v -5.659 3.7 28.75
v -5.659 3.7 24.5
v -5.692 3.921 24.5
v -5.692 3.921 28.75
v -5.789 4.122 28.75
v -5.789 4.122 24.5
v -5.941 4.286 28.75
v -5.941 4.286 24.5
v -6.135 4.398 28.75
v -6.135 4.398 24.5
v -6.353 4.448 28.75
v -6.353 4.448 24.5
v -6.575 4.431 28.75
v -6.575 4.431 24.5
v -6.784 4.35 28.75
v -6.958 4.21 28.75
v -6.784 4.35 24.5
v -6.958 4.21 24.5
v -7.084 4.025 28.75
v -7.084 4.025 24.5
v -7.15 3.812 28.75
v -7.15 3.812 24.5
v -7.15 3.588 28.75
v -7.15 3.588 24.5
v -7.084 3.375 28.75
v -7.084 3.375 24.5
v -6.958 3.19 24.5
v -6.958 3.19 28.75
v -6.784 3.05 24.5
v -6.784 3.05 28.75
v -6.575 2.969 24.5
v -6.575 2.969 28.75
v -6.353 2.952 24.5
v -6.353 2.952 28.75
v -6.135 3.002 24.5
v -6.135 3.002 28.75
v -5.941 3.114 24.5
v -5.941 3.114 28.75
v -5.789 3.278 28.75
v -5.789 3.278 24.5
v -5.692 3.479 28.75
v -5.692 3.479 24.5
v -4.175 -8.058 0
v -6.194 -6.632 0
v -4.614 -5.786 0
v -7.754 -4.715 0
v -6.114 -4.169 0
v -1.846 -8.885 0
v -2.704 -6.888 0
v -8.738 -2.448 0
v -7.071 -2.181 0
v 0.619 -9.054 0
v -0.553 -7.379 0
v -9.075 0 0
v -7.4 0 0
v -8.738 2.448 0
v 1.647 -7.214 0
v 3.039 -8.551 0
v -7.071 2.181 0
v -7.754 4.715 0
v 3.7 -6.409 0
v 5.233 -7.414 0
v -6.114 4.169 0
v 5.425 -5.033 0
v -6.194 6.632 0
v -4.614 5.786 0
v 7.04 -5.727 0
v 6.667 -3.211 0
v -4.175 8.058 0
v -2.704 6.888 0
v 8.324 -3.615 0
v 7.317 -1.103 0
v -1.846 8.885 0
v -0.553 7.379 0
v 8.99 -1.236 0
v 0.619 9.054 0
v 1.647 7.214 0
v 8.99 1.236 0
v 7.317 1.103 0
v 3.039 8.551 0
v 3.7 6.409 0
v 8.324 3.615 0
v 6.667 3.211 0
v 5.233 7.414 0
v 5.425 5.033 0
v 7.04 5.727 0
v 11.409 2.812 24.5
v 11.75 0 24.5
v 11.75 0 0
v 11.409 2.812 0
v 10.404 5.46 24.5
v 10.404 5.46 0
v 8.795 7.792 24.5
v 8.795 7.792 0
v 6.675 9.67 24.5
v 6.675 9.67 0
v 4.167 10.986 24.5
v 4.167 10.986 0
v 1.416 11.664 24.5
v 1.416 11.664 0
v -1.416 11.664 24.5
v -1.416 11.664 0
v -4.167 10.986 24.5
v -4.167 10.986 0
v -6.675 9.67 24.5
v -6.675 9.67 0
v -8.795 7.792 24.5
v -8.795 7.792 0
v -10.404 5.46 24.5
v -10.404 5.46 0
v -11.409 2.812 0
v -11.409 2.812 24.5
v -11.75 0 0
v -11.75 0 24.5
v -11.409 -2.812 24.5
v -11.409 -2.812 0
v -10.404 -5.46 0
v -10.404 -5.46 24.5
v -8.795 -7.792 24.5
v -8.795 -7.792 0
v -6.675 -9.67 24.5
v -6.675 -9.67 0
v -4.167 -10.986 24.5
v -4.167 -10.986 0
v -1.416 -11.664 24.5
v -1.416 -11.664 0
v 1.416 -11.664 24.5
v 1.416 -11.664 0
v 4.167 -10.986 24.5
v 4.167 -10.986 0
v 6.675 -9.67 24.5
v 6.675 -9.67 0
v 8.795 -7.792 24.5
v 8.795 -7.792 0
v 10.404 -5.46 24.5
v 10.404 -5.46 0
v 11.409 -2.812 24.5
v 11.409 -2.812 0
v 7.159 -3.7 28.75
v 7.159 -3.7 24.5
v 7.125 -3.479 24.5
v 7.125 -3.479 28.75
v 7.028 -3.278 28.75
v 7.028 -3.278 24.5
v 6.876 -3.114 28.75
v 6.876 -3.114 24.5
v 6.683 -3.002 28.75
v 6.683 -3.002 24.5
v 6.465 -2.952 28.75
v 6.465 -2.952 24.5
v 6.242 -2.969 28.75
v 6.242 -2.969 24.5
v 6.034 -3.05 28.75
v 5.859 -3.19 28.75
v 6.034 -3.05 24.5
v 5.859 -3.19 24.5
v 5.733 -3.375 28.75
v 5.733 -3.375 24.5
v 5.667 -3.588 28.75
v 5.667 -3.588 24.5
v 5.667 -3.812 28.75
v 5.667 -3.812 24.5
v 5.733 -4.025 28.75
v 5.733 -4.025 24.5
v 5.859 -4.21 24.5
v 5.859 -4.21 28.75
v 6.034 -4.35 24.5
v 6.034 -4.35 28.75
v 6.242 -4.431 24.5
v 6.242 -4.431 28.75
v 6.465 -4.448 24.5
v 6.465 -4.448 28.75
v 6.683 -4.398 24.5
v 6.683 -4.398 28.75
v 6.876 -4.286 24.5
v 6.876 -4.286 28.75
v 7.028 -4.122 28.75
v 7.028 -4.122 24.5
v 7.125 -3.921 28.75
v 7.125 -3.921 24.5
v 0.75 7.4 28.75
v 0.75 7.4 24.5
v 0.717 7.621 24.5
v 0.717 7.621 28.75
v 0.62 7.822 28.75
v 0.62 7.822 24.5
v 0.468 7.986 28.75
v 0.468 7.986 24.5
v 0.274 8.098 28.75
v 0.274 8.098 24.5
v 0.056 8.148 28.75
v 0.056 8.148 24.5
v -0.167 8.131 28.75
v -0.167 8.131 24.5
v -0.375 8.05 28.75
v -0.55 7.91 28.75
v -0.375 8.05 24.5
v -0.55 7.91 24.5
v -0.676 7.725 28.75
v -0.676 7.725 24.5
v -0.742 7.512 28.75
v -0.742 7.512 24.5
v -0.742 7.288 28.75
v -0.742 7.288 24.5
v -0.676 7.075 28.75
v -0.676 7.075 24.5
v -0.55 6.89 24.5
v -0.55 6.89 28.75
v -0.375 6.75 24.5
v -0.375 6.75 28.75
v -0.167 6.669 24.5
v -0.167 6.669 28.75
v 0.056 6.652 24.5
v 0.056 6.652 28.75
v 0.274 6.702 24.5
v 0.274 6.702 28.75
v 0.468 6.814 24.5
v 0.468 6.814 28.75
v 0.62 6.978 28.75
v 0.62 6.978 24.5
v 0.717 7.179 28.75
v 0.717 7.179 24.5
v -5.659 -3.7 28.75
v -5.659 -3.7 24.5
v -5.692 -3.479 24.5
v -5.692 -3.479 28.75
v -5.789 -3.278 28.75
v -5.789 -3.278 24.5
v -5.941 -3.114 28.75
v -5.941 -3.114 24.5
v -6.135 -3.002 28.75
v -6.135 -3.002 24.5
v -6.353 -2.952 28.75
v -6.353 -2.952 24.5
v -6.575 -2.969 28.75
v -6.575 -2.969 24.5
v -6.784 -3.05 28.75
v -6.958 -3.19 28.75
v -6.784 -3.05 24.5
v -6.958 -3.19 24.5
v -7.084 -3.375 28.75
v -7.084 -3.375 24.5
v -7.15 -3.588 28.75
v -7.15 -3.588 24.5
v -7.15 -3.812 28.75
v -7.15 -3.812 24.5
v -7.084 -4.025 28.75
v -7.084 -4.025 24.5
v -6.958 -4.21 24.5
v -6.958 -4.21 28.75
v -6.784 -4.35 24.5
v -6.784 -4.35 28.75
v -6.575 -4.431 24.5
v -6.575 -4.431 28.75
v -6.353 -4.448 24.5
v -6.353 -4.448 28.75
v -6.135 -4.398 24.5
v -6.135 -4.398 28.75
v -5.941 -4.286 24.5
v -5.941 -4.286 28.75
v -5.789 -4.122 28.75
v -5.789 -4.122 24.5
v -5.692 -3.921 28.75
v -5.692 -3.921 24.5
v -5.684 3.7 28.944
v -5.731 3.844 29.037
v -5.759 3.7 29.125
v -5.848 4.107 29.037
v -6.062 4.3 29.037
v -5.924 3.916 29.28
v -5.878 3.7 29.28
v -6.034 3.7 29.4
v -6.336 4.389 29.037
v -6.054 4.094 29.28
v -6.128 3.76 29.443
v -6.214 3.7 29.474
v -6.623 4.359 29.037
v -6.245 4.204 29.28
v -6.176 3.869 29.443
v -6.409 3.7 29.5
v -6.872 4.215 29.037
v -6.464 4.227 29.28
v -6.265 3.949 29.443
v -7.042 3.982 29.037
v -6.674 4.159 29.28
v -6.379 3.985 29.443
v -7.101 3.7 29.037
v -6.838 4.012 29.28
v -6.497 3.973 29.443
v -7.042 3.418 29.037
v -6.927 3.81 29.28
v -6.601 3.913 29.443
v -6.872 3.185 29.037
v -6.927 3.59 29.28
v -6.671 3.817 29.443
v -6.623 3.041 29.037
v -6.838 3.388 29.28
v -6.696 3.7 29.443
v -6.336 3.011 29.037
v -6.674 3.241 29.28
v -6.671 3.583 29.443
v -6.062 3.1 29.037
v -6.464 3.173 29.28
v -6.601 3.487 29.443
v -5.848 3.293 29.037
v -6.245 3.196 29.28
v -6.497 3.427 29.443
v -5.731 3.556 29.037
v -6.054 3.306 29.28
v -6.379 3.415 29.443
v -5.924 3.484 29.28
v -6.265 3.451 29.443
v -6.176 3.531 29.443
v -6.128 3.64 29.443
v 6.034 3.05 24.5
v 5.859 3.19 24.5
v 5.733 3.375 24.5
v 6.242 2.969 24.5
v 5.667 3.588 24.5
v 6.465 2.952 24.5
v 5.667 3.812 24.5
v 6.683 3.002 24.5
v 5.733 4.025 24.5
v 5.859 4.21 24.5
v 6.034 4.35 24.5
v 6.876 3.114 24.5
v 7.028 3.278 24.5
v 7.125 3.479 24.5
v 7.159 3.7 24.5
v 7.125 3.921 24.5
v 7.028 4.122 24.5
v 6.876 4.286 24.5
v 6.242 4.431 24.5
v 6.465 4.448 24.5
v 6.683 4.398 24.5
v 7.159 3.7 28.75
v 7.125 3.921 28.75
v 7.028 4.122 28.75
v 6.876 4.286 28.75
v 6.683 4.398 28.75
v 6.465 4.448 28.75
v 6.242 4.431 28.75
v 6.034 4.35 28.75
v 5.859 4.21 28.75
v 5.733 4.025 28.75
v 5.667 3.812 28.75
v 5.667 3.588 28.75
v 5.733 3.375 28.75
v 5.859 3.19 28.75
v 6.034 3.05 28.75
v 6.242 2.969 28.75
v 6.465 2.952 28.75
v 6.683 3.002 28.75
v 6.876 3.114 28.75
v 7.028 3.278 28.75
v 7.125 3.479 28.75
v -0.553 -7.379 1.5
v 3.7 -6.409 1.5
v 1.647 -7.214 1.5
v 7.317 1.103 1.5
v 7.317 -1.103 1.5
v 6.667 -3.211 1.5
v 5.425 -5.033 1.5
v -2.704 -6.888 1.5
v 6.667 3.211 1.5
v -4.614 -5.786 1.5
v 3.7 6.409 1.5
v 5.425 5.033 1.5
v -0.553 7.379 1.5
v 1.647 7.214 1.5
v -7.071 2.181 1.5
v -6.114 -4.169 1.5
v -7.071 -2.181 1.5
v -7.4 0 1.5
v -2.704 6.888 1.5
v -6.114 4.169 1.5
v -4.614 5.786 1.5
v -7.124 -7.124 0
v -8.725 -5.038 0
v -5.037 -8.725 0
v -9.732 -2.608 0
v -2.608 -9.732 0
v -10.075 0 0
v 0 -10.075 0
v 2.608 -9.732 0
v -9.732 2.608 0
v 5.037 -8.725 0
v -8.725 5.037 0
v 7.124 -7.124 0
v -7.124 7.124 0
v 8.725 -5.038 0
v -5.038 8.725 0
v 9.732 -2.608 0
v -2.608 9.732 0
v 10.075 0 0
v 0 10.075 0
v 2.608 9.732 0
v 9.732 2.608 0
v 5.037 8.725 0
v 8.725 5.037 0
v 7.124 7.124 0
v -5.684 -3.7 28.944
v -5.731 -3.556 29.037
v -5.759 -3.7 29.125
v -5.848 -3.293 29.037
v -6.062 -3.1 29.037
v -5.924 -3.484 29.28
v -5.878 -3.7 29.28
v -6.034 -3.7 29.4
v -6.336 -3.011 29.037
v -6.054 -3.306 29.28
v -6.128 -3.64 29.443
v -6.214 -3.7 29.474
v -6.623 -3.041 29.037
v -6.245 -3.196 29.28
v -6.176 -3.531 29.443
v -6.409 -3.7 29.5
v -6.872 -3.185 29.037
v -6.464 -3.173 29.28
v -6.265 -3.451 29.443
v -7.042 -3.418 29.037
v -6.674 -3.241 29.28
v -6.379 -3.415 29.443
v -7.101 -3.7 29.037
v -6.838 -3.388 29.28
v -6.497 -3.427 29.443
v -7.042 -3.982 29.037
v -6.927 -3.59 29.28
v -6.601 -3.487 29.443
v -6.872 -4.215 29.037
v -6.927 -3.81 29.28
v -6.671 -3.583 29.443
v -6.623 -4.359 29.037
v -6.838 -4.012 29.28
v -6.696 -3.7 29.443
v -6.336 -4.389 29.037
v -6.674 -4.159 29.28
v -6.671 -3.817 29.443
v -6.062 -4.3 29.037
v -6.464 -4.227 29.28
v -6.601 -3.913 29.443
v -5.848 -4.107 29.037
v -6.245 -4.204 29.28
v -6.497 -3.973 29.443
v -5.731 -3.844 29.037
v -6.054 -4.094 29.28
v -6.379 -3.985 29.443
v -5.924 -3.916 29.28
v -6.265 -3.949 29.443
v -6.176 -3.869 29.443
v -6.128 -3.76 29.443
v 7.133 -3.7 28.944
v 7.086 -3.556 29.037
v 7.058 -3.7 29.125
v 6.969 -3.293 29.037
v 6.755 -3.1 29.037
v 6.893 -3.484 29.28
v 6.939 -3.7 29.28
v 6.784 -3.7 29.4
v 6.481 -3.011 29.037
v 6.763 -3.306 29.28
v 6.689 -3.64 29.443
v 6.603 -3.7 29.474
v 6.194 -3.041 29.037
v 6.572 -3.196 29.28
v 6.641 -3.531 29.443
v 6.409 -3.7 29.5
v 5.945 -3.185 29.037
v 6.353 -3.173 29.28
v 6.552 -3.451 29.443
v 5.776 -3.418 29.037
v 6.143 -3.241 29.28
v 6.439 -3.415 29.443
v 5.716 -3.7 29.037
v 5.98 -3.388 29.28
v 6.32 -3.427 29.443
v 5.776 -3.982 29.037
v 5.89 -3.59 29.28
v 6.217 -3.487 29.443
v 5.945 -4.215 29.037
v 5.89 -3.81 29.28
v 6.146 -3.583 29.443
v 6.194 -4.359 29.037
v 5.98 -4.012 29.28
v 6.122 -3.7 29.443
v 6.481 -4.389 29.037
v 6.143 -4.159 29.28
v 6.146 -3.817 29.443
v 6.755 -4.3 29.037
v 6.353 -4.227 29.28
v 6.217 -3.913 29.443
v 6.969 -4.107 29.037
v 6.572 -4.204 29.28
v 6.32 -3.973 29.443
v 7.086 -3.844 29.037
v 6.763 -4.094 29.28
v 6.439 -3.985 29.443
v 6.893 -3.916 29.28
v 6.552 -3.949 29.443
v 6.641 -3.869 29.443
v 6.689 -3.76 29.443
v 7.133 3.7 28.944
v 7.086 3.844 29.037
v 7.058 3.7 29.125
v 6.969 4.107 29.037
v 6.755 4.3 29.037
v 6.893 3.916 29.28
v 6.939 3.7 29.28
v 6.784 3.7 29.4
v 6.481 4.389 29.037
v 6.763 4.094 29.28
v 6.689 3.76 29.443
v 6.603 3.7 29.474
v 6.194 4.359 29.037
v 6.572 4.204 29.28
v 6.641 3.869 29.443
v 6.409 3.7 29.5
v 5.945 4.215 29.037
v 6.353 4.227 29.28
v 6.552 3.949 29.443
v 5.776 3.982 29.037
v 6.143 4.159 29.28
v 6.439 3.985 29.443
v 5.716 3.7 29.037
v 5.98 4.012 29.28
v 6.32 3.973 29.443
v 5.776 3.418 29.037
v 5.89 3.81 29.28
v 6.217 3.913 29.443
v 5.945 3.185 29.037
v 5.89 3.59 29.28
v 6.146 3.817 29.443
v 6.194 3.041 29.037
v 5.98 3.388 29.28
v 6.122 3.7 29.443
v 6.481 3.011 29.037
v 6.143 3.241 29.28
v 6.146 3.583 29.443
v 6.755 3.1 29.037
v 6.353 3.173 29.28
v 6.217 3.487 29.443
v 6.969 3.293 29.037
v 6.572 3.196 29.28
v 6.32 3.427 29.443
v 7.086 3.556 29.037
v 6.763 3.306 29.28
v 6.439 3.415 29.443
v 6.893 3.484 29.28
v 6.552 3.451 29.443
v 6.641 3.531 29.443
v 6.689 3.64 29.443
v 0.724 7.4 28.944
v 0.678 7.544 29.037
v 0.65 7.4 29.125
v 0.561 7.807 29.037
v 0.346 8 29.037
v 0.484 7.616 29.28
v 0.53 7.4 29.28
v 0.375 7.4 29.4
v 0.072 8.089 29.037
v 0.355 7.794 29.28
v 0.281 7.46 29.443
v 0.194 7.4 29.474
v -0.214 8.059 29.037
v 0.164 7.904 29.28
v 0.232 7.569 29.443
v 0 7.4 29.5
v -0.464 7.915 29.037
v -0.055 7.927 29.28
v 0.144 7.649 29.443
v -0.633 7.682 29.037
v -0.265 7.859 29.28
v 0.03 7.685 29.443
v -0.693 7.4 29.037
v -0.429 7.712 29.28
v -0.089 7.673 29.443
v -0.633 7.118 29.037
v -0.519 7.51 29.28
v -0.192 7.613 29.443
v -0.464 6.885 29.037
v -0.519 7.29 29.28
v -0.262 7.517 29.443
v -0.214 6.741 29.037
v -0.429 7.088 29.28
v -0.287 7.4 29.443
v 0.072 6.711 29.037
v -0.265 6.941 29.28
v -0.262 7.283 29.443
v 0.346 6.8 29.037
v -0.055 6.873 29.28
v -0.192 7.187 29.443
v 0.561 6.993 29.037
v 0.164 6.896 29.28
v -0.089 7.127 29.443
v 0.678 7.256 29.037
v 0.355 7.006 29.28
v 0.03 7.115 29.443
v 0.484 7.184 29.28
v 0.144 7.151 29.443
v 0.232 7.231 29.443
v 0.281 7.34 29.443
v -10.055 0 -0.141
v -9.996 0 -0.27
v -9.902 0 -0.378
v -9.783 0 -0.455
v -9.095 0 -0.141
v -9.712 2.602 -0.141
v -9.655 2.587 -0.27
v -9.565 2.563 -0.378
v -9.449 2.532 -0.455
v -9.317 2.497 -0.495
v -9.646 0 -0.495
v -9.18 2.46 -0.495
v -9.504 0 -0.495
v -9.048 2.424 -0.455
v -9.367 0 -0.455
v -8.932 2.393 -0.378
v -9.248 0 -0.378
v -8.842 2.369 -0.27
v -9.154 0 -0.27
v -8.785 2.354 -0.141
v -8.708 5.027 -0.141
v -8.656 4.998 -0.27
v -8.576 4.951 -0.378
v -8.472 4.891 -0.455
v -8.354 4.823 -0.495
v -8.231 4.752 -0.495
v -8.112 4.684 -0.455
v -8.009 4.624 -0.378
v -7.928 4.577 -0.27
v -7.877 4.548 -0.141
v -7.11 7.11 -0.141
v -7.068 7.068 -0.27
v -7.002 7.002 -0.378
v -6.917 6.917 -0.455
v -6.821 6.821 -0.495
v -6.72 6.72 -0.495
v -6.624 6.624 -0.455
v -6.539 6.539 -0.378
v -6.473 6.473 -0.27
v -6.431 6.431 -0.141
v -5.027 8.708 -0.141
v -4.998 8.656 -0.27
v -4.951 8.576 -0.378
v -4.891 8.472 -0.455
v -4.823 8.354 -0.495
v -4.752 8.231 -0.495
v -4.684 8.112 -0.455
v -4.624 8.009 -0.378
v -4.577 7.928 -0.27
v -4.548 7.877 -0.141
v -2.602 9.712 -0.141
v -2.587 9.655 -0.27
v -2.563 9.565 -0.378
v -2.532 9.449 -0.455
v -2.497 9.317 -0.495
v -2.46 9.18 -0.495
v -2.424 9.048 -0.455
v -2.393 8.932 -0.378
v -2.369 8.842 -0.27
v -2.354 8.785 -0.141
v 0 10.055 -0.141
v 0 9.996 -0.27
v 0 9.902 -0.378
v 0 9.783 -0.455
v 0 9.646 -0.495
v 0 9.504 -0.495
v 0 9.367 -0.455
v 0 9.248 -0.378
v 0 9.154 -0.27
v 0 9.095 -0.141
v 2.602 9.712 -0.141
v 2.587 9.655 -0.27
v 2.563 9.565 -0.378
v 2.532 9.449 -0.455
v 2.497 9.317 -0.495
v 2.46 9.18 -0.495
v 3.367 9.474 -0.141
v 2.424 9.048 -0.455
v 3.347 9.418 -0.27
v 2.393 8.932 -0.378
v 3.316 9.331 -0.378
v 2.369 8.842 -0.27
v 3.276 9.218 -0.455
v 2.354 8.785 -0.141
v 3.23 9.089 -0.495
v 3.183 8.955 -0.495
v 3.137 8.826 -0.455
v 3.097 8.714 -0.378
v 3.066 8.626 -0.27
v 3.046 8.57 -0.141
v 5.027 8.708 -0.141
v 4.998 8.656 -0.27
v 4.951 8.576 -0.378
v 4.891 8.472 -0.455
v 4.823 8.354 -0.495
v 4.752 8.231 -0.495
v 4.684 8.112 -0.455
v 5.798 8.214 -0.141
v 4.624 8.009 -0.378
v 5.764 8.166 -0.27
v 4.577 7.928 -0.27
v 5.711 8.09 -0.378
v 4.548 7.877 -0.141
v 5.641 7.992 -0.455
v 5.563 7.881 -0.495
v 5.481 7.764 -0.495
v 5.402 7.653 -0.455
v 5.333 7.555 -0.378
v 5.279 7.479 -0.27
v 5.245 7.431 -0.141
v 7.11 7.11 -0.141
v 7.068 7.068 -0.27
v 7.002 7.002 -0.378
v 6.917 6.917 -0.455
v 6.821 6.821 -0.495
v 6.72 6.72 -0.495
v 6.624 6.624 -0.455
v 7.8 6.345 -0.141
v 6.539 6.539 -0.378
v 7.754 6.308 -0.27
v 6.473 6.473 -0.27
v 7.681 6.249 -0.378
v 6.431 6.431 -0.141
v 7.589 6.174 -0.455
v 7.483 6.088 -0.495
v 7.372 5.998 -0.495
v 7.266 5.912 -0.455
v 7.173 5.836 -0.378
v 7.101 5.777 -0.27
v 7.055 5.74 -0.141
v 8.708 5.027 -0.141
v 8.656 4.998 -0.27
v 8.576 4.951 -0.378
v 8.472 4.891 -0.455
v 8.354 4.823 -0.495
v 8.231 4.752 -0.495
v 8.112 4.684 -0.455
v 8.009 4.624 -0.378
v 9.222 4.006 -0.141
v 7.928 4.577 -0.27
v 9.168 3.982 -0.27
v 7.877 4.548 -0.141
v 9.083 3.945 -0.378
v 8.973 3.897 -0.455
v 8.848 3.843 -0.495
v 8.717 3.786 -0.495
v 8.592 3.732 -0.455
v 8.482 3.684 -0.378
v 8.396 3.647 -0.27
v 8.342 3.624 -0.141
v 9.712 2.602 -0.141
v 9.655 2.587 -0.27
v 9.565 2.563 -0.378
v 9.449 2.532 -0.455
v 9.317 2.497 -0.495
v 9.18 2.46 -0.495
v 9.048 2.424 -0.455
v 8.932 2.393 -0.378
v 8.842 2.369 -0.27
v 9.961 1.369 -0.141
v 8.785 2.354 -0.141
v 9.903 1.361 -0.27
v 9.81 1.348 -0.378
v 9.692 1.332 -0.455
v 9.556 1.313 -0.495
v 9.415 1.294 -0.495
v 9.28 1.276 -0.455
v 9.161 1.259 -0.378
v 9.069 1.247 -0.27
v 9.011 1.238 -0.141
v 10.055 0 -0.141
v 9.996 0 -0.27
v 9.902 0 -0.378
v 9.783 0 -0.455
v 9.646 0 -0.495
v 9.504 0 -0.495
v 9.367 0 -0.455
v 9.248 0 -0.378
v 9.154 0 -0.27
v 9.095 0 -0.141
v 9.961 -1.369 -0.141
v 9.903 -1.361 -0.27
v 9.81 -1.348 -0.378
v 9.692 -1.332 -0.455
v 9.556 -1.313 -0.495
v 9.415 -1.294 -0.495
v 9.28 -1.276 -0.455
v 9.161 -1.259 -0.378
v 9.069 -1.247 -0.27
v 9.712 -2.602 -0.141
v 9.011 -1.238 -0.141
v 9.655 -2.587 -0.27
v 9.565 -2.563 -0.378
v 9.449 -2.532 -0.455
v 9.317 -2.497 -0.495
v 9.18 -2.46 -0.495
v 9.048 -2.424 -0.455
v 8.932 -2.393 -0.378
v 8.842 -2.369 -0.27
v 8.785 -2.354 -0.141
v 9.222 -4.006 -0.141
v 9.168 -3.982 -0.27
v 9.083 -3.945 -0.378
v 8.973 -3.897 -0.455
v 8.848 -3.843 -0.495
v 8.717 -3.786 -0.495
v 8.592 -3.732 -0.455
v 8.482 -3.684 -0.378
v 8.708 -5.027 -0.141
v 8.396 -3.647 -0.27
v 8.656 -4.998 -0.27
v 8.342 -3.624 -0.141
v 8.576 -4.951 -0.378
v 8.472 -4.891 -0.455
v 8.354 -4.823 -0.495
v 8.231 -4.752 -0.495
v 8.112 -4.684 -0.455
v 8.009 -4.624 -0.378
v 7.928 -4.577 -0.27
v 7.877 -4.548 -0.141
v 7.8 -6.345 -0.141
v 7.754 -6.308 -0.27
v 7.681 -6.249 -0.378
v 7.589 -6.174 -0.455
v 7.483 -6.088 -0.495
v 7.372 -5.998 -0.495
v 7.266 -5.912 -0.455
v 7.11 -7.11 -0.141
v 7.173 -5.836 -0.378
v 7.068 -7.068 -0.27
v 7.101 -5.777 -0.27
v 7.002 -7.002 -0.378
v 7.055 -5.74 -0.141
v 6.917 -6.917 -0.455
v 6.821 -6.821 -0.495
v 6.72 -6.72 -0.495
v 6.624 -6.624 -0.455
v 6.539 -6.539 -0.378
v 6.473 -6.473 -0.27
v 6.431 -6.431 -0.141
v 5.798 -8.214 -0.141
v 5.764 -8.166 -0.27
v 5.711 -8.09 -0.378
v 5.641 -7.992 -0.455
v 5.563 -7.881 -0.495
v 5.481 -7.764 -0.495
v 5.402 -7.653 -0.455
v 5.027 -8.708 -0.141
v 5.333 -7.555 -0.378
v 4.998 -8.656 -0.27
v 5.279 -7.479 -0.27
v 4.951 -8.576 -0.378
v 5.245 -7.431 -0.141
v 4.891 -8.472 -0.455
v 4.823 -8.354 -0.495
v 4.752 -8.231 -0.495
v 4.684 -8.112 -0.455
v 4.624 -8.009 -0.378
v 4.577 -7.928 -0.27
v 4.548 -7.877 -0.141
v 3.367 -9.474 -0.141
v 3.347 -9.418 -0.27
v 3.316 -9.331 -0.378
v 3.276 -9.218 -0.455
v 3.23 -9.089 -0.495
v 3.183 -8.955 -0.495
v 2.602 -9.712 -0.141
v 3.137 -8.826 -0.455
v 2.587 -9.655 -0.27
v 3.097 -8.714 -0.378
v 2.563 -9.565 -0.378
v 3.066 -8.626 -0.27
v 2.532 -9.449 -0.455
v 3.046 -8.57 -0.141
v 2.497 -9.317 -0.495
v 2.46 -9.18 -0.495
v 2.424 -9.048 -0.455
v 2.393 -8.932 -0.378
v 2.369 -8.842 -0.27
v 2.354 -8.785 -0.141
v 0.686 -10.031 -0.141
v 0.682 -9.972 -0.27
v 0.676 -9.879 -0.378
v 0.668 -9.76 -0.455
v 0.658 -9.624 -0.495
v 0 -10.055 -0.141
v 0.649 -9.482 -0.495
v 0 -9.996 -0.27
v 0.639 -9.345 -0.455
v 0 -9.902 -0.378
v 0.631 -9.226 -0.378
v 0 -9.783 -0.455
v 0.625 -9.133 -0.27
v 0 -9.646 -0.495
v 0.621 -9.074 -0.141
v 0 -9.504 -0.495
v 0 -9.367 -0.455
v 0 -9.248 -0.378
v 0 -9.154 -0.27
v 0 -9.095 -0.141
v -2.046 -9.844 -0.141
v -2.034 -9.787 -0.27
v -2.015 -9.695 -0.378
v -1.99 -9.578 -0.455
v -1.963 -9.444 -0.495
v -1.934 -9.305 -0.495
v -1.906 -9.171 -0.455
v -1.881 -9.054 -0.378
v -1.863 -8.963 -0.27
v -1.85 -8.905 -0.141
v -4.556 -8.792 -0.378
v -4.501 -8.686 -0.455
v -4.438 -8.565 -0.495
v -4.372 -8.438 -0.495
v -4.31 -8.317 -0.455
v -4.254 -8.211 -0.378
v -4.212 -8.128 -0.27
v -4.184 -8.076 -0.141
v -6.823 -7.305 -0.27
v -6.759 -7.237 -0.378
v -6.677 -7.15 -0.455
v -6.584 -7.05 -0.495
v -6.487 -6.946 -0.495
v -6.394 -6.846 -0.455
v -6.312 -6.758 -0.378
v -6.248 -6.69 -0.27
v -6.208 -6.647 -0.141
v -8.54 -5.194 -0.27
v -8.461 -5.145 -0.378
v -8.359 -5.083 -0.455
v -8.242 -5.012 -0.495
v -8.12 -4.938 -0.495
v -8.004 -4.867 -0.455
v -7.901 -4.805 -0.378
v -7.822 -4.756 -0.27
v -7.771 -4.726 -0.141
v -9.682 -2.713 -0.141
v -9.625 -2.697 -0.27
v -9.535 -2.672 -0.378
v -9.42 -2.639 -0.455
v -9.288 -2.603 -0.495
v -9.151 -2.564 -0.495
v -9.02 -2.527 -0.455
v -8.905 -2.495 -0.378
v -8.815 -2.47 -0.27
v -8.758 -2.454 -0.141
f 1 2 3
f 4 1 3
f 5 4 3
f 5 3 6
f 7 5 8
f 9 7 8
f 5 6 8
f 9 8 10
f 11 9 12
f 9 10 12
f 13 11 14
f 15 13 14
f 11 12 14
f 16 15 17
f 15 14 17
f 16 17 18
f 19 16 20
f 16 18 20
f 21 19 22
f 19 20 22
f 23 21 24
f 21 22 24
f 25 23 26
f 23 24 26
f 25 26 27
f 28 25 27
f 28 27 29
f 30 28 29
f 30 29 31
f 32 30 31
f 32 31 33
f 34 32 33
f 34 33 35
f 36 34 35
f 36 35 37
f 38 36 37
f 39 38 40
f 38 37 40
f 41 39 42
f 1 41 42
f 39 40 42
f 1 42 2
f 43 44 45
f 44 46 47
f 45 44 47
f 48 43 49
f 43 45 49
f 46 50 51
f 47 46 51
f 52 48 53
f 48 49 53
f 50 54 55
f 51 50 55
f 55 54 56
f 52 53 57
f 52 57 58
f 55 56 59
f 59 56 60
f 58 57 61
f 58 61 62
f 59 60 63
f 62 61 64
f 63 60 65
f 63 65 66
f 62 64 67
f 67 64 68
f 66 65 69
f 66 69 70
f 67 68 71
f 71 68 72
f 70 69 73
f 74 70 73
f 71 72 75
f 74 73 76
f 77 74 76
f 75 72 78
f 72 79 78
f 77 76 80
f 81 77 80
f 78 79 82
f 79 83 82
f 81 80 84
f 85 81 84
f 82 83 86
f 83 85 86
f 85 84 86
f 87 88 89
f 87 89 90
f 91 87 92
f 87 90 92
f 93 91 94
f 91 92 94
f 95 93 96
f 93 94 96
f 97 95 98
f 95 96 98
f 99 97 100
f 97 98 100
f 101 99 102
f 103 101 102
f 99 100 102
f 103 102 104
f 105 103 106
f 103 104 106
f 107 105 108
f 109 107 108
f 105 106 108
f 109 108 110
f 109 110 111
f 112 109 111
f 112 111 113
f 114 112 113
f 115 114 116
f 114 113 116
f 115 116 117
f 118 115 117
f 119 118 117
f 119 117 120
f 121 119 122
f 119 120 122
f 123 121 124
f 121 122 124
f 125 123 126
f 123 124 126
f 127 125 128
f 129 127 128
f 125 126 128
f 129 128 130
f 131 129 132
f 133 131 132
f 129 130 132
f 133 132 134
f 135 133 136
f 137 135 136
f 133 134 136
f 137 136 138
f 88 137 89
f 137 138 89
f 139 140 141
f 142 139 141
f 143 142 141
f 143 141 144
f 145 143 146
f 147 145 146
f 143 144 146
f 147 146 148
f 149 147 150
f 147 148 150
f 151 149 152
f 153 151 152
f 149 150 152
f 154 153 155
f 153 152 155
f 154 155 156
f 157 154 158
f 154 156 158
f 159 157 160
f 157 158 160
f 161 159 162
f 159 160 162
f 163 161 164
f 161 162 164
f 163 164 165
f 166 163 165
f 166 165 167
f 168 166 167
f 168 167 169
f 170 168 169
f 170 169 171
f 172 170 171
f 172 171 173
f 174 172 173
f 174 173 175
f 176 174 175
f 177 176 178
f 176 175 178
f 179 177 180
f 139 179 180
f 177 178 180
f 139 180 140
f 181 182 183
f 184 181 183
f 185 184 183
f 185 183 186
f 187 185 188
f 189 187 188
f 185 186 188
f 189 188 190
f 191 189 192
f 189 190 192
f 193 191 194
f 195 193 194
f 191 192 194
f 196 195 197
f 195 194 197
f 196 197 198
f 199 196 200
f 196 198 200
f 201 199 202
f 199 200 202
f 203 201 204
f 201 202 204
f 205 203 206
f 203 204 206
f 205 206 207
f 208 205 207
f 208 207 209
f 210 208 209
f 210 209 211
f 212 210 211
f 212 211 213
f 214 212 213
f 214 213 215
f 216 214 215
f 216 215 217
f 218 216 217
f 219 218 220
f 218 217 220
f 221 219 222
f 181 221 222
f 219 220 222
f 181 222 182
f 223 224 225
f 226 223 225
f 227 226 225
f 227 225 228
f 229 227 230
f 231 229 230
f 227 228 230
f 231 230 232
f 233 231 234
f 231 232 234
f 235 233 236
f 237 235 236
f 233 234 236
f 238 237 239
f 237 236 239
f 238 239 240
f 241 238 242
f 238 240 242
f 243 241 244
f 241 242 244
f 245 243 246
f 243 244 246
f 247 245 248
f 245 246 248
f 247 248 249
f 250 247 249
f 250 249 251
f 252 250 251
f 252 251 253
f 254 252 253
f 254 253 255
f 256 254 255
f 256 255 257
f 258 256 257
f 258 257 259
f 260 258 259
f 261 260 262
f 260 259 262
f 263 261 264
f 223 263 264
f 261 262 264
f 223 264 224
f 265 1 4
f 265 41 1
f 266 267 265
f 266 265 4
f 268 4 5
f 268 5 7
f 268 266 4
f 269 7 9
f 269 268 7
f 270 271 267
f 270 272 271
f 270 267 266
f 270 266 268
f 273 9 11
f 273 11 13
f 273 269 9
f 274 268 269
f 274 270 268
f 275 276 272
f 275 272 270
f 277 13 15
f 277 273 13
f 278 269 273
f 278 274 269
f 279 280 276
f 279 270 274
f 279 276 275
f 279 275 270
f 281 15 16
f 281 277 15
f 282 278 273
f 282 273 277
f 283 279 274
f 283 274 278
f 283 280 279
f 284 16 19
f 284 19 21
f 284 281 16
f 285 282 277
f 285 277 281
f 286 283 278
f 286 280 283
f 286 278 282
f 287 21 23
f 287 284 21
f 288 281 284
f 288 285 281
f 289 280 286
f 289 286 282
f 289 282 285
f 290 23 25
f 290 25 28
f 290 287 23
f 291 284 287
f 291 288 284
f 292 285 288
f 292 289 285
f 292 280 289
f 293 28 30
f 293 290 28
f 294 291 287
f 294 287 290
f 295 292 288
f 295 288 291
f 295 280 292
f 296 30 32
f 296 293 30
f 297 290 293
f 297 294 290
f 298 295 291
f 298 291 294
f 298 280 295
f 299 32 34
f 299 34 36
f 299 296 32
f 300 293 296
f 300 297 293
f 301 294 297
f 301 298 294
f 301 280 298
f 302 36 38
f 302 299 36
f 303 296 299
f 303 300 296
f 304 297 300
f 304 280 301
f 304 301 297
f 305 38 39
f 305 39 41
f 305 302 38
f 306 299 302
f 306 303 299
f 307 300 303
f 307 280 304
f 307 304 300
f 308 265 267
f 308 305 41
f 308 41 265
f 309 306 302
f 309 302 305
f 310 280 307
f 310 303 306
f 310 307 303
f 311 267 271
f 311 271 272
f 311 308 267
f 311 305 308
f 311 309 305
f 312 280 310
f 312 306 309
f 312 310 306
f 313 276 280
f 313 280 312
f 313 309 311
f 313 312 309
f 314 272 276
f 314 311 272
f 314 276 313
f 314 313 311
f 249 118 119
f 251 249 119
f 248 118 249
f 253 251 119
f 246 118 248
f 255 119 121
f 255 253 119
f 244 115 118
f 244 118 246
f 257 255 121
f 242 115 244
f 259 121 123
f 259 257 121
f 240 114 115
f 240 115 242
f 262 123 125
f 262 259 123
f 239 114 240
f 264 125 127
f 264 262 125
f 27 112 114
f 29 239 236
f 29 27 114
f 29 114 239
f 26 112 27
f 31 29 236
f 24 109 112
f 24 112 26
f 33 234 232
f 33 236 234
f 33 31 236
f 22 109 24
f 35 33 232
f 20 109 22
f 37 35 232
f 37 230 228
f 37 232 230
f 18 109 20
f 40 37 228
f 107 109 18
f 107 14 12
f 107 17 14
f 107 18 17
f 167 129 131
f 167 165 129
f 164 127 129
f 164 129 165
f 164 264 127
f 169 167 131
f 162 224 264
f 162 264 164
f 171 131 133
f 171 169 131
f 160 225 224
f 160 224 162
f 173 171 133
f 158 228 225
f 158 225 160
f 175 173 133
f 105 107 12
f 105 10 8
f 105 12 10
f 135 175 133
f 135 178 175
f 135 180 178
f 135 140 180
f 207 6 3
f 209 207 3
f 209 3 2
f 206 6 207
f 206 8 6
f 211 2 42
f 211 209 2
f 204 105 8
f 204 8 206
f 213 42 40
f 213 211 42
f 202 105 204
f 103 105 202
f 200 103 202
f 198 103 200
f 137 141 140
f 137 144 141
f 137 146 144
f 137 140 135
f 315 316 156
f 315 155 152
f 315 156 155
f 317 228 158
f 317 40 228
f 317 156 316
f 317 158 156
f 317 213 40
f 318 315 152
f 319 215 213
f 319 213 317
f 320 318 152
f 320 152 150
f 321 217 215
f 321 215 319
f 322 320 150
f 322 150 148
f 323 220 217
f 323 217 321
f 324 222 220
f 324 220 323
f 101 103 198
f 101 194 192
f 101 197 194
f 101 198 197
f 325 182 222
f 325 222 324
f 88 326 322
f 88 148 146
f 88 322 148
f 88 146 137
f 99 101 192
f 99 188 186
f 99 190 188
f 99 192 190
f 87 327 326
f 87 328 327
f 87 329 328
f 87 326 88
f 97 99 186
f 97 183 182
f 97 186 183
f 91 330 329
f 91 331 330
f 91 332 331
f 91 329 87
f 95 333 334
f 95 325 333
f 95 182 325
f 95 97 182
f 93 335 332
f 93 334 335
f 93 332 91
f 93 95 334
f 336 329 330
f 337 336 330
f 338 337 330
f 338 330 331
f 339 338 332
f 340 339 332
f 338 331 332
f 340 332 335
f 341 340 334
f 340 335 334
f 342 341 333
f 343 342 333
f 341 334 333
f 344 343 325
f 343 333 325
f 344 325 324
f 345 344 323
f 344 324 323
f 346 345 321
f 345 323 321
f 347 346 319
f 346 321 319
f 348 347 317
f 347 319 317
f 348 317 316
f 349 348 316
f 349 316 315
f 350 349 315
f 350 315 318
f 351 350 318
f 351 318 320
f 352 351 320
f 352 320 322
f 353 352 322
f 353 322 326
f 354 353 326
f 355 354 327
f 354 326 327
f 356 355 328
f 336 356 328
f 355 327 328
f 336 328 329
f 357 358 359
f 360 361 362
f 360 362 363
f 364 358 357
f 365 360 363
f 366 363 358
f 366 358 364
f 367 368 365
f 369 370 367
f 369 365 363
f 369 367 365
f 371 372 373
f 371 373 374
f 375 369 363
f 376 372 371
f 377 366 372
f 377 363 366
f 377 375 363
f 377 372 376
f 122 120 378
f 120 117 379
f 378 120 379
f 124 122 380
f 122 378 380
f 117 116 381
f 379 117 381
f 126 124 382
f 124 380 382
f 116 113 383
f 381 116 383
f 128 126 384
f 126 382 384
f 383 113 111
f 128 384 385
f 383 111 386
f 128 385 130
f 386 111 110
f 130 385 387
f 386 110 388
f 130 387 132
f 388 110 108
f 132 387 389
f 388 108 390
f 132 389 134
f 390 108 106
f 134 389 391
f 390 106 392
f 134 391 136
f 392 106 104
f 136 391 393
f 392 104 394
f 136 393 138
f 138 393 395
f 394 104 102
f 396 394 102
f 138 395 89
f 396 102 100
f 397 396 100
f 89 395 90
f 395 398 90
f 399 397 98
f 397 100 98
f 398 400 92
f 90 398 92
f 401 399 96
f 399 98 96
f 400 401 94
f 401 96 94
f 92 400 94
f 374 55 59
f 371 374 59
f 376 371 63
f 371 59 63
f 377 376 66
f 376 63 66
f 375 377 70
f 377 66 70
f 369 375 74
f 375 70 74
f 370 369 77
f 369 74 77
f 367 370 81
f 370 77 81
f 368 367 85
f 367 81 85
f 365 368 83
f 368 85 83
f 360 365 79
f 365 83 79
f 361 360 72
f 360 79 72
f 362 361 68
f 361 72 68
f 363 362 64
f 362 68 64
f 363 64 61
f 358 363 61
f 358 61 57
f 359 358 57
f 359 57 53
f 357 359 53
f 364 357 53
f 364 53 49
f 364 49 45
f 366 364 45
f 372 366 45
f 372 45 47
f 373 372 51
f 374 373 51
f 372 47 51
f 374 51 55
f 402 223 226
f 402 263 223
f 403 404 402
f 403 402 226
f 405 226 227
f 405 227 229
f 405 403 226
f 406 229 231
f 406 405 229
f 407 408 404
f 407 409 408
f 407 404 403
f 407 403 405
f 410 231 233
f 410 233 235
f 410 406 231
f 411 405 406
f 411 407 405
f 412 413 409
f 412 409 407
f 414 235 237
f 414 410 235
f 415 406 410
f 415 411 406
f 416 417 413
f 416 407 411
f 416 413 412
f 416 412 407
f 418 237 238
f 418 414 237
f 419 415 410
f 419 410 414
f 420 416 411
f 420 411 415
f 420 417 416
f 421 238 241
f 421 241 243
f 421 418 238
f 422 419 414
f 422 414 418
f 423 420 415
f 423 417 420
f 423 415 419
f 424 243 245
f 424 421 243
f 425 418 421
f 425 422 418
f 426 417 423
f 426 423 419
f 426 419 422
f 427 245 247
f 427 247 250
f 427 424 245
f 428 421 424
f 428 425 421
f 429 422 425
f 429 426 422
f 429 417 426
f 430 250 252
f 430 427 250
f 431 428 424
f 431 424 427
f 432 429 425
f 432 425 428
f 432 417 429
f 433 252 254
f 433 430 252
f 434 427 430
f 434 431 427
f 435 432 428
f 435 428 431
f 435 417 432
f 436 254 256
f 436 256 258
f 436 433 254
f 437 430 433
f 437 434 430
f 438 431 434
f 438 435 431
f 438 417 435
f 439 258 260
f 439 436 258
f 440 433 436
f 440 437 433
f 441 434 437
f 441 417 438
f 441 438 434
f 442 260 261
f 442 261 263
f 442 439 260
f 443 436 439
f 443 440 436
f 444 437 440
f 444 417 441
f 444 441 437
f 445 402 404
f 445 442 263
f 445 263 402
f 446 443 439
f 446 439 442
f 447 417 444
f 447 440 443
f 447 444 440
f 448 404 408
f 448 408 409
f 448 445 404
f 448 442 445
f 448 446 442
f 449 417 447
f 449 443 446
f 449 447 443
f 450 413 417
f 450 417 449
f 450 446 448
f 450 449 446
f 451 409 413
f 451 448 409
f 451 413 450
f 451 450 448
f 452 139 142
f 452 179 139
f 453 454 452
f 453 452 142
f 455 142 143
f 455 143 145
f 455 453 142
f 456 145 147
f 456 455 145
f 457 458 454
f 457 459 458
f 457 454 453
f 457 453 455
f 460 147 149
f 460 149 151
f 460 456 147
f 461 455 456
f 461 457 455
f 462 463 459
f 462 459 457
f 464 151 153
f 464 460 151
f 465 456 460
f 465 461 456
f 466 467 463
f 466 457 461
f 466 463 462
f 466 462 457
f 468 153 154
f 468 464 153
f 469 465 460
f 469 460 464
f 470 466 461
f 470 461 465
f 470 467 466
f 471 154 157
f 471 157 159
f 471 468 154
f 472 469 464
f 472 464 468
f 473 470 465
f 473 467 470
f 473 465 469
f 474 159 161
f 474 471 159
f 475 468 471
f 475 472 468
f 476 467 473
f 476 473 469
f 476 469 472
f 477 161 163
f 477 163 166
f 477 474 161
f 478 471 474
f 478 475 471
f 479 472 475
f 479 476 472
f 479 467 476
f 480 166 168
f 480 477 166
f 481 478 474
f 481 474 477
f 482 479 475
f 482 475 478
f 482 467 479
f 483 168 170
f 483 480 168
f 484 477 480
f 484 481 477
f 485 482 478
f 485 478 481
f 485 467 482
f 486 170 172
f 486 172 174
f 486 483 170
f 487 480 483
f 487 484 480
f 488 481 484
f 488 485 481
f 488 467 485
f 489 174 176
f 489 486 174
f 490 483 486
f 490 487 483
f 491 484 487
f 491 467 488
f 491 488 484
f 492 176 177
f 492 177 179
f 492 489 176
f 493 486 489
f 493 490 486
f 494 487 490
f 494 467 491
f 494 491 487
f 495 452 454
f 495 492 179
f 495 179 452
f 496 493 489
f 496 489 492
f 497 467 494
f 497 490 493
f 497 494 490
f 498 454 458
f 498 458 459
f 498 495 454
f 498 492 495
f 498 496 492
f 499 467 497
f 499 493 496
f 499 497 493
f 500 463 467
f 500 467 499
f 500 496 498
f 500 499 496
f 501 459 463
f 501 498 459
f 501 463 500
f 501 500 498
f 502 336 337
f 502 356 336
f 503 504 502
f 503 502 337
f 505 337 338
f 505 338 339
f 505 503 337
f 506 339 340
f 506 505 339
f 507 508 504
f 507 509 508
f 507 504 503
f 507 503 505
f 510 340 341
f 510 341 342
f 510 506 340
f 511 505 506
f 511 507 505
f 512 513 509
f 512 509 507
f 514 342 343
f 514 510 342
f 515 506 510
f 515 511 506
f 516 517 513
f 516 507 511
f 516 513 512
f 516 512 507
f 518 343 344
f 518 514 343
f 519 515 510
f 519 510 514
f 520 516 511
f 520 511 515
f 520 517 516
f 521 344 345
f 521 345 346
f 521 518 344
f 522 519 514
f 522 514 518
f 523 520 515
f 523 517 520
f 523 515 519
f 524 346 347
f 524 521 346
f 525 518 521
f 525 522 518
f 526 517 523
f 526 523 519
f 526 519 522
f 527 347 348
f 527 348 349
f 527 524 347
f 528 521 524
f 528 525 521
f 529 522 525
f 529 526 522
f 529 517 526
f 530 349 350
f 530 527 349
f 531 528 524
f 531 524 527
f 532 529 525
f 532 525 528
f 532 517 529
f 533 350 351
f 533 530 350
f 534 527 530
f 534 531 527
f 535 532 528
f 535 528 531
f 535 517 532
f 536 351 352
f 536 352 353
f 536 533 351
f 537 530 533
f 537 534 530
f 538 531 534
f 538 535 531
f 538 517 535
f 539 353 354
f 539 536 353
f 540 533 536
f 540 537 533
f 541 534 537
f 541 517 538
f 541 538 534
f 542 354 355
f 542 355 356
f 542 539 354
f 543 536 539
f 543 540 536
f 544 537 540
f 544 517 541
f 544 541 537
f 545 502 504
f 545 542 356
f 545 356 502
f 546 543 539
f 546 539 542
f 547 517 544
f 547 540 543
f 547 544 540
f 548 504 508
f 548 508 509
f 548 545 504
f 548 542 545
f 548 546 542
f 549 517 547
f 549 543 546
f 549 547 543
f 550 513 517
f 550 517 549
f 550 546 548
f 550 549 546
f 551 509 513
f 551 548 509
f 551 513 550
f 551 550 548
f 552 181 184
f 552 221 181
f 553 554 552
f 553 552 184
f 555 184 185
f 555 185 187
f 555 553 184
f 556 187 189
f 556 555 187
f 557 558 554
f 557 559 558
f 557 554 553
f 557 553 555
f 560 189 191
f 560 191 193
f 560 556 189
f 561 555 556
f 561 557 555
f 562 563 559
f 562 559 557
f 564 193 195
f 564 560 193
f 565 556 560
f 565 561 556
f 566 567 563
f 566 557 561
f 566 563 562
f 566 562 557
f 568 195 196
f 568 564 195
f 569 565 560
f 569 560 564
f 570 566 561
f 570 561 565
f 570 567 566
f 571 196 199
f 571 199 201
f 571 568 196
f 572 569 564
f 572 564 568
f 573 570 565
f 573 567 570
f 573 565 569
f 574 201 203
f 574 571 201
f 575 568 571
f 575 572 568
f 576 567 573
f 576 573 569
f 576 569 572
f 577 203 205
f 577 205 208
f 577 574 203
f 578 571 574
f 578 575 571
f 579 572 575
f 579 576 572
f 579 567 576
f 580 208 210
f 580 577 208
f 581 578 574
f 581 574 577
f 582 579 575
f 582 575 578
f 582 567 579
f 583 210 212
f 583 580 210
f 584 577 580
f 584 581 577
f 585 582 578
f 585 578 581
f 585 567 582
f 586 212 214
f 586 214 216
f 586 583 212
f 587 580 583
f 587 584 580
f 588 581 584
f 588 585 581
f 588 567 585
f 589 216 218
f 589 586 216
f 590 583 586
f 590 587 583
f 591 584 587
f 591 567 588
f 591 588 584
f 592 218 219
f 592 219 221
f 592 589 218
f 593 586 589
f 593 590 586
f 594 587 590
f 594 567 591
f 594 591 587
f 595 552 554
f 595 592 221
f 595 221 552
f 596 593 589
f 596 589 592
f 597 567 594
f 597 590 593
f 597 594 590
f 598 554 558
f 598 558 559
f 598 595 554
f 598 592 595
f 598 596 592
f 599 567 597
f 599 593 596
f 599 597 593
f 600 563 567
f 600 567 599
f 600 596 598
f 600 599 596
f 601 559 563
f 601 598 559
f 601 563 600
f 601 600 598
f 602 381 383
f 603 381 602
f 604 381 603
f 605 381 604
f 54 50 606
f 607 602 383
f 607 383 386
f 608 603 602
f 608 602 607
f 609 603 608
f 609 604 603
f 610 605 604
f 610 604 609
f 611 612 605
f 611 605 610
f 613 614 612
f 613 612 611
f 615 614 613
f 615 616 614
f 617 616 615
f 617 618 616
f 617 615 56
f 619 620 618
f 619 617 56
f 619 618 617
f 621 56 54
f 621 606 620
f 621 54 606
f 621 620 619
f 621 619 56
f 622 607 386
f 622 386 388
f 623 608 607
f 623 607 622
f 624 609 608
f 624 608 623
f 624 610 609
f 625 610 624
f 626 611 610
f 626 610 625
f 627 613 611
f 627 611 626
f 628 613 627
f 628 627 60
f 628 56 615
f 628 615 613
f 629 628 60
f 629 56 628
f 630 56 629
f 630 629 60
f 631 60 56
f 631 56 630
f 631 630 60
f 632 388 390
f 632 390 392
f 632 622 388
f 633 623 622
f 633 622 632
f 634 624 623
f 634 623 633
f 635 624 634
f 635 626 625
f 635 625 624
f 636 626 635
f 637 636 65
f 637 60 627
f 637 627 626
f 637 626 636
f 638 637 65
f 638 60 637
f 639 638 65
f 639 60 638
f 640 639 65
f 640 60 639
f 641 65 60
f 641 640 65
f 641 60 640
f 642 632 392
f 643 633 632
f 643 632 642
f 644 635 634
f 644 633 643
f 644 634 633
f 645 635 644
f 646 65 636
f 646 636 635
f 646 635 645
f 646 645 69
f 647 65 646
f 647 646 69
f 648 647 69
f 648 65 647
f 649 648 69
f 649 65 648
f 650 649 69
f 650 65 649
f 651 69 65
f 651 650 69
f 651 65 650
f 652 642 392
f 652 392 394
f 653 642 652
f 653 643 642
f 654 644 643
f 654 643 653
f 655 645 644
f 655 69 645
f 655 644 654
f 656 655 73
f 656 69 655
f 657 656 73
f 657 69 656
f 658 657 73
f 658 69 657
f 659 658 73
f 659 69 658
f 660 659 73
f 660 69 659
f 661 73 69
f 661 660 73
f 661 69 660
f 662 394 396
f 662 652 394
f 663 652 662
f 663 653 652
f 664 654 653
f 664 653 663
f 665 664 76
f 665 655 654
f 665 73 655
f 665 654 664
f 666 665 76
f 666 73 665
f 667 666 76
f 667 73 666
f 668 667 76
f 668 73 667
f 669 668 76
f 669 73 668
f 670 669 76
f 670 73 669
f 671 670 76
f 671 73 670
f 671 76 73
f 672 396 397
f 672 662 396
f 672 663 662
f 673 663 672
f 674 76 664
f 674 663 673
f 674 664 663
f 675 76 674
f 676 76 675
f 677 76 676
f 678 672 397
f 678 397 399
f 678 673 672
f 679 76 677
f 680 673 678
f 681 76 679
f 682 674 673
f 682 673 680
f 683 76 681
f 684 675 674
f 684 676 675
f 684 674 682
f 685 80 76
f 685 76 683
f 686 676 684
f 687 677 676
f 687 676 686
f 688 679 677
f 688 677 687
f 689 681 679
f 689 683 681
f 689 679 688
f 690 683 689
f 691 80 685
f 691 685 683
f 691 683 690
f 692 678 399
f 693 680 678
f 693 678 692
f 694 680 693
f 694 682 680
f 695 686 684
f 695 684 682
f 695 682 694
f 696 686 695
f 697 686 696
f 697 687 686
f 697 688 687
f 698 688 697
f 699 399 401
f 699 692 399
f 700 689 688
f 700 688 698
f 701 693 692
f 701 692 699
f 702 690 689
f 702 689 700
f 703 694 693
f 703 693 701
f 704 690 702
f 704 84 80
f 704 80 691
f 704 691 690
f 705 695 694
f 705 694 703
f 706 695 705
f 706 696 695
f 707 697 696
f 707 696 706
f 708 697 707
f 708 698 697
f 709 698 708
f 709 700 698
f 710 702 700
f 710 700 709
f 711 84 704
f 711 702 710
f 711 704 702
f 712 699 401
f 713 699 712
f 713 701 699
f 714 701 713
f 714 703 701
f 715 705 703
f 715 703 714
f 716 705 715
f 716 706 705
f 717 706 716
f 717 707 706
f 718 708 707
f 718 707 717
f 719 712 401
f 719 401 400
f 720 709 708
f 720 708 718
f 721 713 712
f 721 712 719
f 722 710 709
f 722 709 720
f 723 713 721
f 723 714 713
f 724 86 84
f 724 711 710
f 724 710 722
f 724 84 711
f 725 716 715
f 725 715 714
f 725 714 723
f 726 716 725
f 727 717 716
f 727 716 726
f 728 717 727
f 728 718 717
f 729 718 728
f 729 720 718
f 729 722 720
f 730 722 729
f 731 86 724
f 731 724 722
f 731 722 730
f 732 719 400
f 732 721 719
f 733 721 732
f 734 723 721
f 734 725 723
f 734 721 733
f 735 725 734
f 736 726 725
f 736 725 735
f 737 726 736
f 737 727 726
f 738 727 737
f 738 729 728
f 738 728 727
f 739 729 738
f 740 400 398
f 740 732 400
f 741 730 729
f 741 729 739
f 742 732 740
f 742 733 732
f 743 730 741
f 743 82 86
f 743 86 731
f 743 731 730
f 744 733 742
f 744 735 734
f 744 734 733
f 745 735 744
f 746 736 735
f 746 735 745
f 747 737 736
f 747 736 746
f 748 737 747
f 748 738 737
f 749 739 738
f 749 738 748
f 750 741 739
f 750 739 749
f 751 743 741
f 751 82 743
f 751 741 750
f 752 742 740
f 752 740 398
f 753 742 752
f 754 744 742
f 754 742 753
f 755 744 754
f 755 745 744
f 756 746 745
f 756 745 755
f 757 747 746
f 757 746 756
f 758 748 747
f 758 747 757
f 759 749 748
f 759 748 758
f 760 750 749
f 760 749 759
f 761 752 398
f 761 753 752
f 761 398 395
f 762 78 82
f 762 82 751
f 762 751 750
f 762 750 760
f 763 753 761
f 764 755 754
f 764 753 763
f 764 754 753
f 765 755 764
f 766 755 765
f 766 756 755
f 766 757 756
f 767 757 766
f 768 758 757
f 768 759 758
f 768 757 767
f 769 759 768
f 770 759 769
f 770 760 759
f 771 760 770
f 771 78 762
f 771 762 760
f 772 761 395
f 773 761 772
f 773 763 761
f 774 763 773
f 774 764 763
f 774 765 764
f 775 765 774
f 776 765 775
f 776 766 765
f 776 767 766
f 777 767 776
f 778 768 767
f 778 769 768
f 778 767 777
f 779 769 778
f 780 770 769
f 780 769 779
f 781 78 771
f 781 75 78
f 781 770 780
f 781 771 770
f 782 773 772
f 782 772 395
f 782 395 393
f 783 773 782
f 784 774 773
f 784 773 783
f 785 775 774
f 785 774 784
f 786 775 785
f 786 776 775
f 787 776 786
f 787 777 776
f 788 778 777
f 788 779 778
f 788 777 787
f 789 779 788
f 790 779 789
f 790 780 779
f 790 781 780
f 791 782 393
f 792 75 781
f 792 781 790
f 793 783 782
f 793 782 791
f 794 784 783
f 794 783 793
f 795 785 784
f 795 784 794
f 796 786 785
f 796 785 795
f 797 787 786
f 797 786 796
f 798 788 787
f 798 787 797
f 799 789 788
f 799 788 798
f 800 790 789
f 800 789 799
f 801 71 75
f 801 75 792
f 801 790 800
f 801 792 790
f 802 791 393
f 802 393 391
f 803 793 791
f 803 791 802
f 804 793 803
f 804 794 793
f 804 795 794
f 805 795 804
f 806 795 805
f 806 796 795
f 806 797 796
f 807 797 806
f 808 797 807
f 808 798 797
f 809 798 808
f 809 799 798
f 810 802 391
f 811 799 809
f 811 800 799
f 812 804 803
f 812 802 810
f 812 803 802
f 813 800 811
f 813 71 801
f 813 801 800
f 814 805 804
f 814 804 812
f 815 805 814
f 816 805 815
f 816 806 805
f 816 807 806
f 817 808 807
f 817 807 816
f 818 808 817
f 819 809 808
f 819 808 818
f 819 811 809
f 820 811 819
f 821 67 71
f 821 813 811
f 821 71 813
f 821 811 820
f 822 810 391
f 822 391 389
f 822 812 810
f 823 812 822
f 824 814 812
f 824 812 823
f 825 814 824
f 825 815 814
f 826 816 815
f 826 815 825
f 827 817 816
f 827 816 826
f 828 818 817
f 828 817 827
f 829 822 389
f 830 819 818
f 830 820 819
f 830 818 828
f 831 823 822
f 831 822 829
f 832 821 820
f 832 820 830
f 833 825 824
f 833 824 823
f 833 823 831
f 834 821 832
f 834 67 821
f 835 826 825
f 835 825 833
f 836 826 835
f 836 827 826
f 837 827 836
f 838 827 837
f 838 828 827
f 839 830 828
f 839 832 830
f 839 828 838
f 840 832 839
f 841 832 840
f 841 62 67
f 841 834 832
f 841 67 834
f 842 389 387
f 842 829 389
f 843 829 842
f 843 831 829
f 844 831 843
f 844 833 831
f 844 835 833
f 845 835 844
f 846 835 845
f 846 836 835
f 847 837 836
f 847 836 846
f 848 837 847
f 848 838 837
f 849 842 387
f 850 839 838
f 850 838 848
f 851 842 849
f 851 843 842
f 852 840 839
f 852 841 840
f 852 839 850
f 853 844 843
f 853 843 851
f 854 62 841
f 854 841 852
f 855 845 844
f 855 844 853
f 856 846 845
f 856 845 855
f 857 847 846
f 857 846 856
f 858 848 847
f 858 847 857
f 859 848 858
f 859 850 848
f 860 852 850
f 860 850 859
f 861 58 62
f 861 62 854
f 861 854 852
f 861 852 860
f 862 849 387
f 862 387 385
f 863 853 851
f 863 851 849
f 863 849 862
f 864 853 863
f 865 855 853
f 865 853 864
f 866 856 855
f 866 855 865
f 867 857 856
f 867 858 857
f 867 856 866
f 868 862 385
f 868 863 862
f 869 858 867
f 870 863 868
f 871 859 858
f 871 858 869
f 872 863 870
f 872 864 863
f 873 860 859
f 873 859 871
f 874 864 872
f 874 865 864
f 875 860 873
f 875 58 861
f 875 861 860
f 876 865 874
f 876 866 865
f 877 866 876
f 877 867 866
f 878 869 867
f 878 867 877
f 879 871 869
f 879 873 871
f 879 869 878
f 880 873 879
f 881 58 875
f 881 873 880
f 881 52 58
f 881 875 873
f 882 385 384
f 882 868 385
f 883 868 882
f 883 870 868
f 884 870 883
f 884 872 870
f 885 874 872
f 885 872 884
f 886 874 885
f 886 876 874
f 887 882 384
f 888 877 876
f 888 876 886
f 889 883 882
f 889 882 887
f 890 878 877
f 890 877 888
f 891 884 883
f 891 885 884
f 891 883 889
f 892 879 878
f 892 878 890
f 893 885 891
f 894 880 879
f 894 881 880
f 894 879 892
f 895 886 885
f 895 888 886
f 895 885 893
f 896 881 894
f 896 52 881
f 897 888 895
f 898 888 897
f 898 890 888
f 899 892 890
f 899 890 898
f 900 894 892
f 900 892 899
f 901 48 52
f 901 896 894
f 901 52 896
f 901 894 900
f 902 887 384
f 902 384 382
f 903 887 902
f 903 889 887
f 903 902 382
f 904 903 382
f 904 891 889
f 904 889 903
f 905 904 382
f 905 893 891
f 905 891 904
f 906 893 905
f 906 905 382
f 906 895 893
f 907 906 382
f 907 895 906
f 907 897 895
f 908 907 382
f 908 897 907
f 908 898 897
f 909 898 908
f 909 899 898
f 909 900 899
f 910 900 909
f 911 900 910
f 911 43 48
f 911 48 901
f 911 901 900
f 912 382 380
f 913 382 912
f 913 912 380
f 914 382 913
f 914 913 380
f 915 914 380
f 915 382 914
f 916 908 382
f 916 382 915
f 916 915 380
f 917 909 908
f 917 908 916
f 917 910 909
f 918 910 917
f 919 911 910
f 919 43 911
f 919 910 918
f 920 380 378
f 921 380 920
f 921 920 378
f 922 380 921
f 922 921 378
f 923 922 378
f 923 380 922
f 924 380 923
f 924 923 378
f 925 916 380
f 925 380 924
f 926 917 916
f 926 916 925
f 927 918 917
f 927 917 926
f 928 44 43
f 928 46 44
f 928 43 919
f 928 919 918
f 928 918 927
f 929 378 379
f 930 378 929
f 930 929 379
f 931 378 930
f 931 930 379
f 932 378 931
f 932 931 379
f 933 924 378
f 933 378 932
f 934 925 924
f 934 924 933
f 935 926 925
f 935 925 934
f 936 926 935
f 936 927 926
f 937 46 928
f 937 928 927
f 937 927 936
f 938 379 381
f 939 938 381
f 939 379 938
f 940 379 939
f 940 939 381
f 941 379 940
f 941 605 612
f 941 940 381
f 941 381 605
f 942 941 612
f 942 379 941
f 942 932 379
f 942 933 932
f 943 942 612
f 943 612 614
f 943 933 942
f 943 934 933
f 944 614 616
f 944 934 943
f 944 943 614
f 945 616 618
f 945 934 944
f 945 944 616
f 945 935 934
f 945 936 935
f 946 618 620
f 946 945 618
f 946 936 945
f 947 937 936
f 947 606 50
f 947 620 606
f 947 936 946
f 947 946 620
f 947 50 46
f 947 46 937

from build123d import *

# Parameters (mm, degrees)
SKETCH_1_R          = 11.75
EXTRUDE_1_DEPTH     = 24.5
SKETCH_2_R          = 0.75
EXTRUDE_2_DEPTH     = 5
FILLET_1_R          = 0.75
SKETCH_3_R          = 7.4
CUT_EXTRUDE_1_DEPTH = 1.5
SKETCH_5_R          = 0.5


with BuildPart() as part:
    # 草图1 → 凸台-拉伸1 (new body)
    with BuildSketch(Plane.XY):
        Circle(SKETCH_1_R)
    extrude(amount=EXTRUDE_1_DEPTH)

    # 草图2 → 凸台-拉伸2 (add)
    with BuildSketch(Plane.XY.offset(24.5)):
        with Locations((-6.408587988, 3.7)):
            Circle(SKETCH_2_R)
        with Locations((0, 7.4)):
            Circle(SKETCH_2_R)
        with Locations((6.408587988, 3.7)):
            Circle(SKETCH_2_R)
        with Locations((6.408587988, -3.7)):
            Circle(SKETCH_2_R)
        with Locations((-6.408587988, -3.7)):
            Circle(SKETCH_2_R)
    extrude(amount=EXTRUDE_2_DEPTH)

    # 圆角1
    fillet_1_edges = [part.edges().sort_by_distance(p)[0] for p in [
        (5.658587988, 3.7, 29.5),
        (5.658587988, -3.7, 29.5),
        (-7.158587988, -3.7, 29.5),
        (-7.158587988, 3.7, 29.5),
        (-0.75, 7.4, 29.5),
    ]]
    fillet(fillet_1_edges, radius=FILLET_1_R)

    # 草图3 → 切除-拉伸1 (cut)
    with BuildSketch(Plane(origin=(0, 0, 0), x_dir=(-1, 0, 0), z_dir=(0, 0, -1))):
        Circle(SKETCH_3_R)
    extrude(amount=-CUT_EXTRUDE_1_DEPTH, mode=Mode.SUBTRACT)

    # 扫描1: sweep along a path in 草图4
    with BuildLine(Plane(origin=(0, 0, 0), x_dir=(-1, 0, 0), z_dir=(0, 0, -1))) as sweep_1_path:
        CenterArc((0, 0), 9.575, 0, 360)
    # 草图5 → 扫描1 (sweep)
    with BuildSketch(Plane(origin=(0, 0, 0), x_dir=(1, 0, 0), z_dir=(0, 1, 0))):
        with Locations((-9.575, 0)):
            Circle(SKETCH_5_R)
    sweep(path=sweep_1_path.line)


solid = part.part
